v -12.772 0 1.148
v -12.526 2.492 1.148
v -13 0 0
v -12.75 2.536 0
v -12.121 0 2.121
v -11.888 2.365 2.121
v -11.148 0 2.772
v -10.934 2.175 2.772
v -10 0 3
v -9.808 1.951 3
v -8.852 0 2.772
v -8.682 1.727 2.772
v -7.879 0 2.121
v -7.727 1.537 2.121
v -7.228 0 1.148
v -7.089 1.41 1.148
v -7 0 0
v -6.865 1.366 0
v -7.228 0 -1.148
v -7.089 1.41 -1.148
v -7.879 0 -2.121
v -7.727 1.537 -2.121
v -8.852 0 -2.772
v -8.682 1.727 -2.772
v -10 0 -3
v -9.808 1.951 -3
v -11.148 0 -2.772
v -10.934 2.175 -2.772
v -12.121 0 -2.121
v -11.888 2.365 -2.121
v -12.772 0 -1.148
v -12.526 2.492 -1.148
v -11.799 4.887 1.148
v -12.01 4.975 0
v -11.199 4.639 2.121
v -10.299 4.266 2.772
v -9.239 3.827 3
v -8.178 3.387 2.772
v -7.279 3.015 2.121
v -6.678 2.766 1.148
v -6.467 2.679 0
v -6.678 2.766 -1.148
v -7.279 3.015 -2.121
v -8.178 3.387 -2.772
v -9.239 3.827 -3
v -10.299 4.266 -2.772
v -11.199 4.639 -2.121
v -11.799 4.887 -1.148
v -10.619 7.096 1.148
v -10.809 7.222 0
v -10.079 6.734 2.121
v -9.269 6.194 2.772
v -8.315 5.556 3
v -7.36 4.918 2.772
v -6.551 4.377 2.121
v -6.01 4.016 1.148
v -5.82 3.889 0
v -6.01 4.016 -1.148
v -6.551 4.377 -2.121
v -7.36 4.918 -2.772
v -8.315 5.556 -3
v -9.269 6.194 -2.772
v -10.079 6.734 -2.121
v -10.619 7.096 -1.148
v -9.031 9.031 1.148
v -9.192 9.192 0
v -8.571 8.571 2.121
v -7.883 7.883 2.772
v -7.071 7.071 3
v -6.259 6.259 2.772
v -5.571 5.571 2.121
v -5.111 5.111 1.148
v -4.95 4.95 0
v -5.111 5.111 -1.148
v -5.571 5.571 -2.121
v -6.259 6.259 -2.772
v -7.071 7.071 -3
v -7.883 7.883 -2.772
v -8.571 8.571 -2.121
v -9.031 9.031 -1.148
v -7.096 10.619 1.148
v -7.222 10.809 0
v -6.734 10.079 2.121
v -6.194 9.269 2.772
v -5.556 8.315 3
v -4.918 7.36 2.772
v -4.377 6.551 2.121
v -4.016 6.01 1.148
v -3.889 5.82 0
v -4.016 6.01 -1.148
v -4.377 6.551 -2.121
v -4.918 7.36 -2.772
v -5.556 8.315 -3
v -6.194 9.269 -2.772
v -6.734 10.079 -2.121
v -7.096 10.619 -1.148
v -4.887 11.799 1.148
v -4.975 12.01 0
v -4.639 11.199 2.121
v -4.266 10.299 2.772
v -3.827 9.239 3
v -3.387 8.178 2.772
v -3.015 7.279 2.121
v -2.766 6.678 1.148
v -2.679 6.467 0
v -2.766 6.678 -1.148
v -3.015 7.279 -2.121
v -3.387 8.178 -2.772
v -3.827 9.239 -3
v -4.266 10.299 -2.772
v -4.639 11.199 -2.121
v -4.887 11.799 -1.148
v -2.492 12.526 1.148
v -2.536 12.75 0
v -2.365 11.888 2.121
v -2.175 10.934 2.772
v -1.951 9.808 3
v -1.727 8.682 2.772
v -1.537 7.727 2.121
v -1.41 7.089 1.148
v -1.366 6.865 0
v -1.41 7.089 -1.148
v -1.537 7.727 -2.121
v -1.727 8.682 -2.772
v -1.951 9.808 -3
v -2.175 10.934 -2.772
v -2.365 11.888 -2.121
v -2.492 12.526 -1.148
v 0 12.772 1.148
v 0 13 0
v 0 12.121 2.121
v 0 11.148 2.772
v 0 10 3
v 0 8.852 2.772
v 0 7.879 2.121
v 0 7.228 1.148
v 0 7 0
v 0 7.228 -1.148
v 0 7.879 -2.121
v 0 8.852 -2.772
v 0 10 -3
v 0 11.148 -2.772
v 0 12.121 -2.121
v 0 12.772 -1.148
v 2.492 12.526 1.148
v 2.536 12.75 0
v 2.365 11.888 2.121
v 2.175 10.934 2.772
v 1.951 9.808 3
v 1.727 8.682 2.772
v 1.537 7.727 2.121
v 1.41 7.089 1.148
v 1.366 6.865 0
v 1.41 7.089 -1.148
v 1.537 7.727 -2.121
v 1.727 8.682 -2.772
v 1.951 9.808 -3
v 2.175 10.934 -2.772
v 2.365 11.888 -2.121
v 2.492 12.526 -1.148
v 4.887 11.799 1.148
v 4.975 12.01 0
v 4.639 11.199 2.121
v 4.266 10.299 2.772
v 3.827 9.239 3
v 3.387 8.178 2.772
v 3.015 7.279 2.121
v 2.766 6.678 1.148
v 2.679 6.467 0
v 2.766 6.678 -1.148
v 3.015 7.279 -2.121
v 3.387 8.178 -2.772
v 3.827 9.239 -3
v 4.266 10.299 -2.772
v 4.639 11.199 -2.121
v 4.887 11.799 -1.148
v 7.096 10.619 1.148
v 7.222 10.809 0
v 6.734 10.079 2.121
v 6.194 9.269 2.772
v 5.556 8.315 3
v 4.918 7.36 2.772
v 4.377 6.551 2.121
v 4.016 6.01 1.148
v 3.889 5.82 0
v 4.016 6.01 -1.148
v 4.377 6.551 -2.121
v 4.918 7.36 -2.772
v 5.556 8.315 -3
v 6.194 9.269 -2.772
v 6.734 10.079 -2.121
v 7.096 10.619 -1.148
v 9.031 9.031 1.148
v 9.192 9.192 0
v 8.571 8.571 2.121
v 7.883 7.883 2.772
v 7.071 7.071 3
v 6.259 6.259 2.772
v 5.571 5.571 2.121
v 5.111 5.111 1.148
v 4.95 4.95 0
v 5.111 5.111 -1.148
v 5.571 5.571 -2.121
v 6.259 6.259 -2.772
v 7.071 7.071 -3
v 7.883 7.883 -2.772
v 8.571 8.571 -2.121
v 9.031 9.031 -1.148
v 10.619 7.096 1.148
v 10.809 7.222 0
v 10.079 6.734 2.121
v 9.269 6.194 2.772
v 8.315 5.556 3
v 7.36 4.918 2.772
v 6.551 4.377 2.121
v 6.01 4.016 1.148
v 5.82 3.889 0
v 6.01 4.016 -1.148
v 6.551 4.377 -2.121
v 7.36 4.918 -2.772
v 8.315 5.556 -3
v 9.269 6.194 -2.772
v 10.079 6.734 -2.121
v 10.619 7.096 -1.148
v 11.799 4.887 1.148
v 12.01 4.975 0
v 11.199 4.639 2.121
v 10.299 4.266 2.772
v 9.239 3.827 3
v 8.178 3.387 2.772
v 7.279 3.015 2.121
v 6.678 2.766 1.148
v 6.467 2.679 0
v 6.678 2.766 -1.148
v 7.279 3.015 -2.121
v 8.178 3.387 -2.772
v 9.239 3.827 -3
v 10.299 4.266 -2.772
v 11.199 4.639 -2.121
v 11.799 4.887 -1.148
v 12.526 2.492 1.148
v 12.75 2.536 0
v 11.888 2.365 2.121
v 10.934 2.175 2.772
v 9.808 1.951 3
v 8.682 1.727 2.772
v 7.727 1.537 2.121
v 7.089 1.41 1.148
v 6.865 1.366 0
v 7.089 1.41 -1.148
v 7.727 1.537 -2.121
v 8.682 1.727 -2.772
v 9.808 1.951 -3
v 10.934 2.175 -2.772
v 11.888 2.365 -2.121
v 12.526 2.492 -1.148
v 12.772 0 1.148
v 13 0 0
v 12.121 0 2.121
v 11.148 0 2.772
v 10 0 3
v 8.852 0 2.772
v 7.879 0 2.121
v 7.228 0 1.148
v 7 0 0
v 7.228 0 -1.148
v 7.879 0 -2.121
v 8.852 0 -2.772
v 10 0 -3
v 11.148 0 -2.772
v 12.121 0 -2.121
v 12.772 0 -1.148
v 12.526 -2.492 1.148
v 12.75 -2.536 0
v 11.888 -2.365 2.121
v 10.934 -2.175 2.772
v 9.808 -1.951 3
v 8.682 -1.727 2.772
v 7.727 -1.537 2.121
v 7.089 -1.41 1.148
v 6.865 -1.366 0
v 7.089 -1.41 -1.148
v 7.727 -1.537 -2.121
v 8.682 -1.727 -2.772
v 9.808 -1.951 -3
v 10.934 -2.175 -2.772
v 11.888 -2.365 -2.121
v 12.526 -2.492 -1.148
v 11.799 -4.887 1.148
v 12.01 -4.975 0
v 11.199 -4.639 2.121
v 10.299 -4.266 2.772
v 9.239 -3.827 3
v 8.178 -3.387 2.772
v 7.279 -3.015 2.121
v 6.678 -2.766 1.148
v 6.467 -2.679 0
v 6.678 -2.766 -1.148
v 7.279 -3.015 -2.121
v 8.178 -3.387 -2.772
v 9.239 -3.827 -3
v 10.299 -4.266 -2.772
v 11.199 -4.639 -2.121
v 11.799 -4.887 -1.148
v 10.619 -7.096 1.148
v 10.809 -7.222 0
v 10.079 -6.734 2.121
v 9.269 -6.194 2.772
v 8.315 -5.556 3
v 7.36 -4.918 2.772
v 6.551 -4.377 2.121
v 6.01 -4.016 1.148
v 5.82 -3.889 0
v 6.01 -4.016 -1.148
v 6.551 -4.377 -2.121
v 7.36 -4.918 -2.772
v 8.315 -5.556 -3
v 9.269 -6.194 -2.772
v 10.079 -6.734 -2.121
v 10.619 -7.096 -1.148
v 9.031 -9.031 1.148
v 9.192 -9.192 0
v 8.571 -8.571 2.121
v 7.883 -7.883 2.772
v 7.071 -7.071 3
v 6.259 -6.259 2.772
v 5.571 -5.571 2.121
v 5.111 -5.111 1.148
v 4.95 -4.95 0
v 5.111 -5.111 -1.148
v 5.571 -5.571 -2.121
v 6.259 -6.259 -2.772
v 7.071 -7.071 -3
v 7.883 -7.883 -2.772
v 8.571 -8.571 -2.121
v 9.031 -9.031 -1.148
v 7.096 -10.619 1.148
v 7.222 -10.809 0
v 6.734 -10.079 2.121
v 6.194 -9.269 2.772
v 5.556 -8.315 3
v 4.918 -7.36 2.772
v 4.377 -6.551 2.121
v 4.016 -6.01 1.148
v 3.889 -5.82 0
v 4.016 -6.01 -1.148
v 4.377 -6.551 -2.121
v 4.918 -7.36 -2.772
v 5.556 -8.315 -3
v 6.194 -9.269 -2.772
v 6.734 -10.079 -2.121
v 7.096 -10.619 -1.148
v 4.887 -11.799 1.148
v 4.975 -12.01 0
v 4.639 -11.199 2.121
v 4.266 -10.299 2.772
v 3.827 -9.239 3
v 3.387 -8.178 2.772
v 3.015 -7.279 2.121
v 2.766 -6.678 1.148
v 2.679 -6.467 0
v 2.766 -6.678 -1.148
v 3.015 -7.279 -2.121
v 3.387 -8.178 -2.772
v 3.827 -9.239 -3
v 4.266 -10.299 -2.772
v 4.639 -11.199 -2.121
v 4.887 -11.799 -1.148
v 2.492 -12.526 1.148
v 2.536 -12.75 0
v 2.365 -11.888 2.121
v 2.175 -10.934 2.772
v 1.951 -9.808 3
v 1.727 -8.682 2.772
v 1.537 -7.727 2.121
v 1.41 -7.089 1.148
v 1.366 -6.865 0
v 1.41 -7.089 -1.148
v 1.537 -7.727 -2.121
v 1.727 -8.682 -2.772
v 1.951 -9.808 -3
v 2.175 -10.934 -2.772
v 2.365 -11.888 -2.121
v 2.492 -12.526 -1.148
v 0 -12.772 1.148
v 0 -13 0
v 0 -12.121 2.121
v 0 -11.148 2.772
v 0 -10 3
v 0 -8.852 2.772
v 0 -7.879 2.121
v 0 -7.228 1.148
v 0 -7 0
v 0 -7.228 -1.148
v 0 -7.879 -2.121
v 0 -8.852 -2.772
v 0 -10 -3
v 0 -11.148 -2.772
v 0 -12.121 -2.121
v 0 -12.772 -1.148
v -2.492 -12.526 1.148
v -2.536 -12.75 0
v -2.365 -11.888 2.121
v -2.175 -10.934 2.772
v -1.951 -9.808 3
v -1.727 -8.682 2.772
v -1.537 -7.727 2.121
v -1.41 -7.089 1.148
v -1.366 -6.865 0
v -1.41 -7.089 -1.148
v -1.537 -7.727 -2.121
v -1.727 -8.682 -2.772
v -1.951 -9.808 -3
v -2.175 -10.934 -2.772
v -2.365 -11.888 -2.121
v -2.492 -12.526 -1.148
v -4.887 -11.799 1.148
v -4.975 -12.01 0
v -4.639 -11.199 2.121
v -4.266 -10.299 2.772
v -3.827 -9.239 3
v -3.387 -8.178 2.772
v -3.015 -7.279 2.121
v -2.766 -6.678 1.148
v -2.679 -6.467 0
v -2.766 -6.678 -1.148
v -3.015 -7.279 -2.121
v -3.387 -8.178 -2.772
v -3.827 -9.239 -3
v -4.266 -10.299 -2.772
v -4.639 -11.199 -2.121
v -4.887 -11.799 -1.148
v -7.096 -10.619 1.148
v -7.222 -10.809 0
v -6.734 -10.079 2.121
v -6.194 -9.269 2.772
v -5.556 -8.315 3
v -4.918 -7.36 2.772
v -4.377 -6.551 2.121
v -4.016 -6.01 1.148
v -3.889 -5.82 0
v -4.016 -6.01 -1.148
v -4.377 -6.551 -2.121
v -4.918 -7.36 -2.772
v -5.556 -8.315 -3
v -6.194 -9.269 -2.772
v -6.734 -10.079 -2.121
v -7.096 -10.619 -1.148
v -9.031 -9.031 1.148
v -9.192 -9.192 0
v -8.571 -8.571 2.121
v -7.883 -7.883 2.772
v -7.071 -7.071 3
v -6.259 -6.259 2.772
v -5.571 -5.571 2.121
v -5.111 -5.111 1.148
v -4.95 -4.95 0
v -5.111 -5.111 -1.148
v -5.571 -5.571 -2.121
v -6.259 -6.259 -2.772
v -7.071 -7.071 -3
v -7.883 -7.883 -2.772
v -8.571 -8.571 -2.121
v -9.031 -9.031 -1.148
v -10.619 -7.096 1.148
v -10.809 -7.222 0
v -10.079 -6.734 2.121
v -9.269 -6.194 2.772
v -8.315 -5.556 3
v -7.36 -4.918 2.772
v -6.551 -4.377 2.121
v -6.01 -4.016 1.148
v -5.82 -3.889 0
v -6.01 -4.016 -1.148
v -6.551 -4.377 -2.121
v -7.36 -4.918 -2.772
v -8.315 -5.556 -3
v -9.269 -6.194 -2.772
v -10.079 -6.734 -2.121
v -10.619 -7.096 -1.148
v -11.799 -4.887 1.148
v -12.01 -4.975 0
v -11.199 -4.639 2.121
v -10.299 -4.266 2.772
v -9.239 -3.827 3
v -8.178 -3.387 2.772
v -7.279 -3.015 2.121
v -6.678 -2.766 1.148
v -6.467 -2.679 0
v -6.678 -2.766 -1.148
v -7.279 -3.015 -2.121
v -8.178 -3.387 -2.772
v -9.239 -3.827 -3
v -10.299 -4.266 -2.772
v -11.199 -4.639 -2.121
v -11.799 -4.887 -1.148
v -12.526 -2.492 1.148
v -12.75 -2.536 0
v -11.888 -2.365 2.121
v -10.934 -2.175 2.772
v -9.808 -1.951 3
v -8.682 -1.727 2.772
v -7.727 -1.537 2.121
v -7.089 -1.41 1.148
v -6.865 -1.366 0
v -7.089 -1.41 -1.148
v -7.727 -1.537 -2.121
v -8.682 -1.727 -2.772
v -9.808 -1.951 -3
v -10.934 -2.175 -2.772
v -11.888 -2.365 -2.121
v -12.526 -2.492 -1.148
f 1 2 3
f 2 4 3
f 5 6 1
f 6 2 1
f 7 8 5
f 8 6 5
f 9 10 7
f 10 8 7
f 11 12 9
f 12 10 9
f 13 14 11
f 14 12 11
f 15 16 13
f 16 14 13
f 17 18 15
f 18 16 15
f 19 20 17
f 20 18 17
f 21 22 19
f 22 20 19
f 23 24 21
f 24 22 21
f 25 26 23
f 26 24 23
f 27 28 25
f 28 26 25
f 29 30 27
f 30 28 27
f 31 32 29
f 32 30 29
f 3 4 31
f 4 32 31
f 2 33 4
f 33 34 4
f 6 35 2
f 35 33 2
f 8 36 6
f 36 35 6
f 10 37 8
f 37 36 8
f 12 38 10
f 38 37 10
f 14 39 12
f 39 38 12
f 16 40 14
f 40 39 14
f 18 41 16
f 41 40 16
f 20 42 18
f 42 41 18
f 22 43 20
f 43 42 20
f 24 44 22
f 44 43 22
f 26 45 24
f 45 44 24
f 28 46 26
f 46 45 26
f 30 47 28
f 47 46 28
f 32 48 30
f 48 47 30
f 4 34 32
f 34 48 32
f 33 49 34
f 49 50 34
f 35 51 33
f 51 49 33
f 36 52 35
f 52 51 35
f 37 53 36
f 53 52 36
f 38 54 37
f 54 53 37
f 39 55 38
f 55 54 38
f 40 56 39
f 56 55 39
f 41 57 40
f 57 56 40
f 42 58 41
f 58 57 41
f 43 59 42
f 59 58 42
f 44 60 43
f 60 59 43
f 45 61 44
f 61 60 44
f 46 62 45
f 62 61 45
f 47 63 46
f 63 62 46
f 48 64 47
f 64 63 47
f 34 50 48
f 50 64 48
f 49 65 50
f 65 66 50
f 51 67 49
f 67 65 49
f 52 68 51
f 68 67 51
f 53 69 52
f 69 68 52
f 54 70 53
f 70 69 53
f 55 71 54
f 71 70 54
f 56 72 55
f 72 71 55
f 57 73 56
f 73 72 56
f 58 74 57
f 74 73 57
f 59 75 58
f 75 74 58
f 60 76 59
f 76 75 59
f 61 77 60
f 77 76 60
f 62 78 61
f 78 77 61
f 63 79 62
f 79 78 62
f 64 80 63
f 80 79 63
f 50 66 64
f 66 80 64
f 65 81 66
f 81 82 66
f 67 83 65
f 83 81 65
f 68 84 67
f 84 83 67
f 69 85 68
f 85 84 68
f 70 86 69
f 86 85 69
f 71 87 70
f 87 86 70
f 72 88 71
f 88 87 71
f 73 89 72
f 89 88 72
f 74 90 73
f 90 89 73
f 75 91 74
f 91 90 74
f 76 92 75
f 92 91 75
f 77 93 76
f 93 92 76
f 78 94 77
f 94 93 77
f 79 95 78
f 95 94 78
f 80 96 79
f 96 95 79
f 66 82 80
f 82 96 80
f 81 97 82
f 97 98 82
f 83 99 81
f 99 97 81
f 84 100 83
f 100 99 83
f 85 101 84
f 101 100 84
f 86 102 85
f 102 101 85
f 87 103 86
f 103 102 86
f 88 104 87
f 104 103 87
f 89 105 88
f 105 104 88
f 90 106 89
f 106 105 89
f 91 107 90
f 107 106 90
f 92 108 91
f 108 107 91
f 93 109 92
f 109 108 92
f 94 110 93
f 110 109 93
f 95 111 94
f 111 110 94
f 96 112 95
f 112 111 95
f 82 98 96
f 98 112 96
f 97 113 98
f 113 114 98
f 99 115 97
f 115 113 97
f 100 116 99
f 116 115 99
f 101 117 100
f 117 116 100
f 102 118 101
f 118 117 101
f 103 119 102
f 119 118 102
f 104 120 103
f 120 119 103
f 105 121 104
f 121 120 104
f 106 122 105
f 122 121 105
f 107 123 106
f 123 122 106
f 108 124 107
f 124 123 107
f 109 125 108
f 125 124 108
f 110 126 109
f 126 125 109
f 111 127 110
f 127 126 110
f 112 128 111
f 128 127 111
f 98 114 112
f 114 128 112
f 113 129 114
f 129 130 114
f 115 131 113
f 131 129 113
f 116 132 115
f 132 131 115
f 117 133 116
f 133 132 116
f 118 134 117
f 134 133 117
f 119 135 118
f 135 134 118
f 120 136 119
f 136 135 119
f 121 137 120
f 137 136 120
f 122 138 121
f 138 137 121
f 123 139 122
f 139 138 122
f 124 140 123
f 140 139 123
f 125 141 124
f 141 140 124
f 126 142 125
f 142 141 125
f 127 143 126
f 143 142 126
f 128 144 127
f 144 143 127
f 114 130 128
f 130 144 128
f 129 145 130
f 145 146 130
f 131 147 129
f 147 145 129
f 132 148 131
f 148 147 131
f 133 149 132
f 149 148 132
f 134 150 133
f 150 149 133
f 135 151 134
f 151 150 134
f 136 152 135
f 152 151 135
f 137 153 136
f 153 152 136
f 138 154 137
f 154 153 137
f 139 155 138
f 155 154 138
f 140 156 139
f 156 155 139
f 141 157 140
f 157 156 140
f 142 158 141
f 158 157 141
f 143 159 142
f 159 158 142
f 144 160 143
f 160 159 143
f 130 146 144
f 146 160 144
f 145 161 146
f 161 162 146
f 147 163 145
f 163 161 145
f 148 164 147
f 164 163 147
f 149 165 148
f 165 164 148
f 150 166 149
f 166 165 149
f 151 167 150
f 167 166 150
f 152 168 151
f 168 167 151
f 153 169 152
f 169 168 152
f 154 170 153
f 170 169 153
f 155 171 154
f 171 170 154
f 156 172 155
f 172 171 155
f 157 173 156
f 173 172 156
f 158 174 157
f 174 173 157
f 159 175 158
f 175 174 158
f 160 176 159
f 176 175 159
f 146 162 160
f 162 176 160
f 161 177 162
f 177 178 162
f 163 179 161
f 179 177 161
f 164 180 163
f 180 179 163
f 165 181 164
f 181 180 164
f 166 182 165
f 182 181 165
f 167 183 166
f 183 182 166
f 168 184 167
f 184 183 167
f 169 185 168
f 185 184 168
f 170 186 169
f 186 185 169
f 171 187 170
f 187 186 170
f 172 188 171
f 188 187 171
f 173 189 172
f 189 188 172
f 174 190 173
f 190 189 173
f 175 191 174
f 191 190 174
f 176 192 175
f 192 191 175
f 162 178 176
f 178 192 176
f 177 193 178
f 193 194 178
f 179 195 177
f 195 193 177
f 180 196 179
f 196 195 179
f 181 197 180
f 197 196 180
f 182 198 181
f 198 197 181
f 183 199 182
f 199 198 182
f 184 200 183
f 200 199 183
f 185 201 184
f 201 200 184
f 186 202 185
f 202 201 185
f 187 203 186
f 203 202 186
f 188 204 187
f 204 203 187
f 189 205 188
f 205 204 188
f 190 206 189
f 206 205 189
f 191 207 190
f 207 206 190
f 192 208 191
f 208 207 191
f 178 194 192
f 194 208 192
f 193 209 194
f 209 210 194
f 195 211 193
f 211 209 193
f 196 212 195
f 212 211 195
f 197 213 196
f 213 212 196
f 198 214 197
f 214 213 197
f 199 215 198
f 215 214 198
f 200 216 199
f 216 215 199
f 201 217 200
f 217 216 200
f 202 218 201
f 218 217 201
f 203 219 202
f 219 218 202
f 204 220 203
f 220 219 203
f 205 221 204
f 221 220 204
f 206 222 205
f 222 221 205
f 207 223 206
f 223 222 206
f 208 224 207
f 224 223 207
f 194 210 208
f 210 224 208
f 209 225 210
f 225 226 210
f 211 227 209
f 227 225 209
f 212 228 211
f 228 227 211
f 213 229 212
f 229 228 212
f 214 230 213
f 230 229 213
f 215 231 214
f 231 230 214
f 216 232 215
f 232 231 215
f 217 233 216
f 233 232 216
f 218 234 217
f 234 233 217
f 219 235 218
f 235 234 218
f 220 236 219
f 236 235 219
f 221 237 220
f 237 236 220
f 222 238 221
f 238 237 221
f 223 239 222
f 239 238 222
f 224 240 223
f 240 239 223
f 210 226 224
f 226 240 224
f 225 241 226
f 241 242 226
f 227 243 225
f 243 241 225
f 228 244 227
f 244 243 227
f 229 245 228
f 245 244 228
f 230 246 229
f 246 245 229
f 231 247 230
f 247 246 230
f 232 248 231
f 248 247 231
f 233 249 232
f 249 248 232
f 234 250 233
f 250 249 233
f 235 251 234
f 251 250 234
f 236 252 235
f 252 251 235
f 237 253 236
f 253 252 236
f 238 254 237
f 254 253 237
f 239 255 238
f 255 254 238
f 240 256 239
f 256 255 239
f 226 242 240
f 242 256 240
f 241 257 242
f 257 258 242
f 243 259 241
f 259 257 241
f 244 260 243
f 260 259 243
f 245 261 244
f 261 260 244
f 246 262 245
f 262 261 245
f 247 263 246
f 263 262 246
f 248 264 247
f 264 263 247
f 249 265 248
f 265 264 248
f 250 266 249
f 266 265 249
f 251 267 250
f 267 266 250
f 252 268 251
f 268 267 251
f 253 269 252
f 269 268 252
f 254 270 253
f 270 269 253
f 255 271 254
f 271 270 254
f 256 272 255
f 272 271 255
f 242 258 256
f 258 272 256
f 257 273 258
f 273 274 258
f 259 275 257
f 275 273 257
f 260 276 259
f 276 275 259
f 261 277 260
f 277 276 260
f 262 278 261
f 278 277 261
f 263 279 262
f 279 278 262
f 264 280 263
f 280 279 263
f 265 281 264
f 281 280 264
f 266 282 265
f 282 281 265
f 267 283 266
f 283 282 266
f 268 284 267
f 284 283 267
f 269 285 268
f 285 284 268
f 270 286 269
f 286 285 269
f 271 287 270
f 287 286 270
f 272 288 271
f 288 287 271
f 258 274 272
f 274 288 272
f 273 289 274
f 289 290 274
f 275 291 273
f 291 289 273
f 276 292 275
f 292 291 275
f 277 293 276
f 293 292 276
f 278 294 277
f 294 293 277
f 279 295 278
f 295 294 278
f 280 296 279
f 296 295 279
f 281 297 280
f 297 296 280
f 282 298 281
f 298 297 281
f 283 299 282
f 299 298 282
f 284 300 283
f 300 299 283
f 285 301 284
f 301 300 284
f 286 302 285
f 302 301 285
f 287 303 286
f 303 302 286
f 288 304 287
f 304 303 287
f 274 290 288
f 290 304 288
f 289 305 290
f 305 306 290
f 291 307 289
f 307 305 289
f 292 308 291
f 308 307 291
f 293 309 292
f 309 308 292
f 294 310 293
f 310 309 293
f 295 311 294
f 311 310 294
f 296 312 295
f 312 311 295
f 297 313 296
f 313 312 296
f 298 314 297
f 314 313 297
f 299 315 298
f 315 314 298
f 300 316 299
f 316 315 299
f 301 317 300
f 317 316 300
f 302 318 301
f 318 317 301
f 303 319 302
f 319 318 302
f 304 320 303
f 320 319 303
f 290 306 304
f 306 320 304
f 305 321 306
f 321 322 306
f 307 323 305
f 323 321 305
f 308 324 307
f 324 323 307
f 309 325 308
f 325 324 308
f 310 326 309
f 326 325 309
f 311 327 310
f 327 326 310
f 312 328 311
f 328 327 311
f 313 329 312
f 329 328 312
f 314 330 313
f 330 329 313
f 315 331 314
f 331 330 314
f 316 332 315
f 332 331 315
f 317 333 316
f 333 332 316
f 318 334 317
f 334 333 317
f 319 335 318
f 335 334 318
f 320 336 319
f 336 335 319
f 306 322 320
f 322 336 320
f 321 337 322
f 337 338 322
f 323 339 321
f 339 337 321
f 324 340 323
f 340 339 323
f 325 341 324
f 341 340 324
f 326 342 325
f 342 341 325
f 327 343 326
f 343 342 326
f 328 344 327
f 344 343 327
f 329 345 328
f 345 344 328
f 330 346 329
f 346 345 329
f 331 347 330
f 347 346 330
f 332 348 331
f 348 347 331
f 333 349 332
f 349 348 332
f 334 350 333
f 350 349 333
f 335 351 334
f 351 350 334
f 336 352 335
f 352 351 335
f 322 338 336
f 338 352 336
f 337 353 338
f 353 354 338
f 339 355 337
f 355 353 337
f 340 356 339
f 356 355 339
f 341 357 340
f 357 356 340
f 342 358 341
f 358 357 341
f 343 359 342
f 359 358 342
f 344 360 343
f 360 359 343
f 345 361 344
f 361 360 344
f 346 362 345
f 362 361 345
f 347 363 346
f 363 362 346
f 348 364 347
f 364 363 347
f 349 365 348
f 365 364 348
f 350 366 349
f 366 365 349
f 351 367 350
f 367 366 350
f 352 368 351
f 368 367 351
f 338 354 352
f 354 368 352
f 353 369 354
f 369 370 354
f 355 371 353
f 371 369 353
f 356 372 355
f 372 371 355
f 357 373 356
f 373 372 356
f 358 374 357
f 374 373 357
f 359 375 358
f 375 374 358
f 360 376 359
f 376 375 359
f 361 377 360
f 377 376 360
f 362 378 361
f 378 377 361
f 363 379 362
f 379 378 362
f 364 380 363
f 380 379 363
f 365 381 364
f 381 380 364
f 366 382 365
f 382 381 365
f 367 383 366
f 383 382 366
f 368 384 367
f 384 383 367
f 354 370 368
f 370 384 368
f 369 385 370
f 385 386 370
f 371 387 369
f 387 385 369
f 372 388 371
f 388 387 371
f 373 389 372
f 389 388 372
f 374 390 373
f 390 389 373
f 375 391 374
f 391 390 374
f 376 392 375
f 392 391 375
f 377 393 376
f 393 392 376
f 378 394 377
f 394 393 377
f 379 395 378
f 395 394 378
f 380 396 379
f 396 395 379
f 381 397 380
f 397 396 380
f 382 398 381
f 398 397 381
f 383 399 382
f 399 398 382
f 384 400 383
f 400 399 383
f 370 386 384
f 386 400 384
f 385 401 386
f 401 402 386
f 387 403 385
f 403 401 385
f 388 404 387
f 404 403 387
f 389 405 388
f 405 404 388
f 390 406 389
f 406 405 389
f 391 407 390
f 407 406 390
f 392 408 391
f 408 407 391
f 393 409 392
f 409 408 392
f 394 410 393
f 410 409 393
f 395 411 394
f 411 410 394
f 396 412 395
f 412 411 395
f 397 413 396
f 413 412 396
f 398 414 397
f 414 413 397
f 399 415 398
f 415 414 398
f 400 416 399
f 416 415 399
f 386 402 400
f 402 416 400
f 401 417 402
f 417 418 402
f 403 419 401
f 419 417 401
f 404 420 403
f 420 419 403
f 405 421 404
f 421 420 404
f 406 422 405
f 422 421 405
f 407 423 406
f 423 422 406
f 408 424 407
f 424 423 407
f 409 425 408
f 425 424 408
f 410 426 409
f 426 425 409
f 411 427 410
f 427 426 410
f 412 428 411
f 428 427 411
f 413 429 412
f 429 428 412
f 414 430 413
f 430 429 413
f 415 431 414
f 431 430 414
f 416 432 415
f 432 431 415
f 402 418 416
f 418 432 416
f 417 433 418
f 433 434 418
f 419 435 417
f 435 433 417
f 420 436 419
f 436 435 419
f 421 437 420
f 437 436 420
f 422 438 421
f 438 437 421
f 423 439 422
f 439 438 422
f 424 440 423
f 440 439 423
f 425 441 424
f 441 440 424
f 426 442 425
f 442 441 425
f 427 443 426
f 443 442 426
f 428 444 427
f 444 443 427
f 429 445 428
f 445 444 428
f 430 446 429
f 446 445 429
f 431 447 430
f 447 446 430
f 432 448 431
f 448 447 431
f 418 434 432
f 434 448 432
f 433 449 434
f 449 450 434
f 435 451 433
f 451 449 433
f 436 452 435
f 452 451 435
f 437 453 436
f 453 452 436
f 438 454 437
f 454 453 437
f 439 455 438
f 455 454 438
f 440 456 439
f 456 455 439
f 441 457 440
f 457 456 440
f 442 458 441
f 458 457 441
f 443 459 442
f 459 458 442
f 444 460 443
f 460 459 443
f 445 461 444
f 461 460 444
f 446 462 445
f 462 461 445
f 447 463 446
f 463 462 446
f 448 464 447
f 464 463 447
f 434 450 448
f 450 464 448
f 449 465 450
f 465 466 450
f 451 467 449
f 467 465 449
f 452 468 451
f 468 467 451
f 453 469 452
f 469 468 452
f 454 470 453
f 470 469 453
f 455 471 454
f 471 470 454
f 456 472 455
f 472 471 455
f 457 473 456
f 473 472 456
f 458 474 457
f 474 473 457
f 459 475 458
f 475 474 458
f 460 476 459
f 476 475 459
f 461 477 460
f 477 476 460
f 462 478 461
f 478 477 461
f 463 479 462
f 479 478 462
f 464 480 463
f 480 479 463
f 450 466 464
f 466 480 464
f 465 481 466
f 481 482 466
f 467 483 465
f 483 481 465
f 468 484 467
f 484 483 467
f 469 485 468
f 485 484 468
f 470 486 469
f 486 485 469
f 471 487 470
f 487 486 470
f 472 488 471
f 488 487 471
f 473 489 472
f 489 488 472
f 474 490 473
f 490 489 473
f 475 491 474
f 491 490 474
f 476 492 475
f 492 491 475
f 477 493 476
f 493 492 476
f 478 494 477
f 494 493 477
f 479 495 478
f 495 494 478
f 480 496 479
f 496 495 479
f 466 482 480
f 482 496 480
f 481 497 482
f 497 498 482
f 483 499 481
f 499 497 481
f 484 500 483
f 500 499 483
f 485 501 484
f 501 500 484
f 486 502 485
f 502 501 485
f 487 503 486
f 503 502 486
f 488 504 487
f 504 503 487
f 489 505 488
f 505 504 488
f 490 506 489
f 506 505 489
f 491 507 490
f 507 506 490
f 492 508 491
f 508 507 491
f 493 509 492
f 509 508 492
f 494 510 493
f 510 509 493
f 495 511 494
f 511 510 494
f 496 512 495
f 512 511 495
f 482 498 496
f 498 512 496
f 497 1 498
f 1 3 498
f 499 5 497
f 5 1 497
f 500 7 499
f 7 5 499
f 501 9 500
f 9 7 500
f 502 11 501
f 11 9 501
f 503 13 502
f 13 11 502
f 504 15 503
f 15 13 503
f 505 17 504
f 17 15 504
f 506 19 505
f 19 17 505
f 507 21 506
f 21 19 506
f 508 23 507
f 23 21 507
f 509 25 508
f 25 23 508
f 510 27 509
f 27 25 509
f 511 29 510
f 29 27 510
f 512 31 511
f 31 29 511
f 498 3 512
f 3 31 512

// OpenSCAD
rotate_extrude($fn = 32) translate([10, 0]) circle(r = 3, $fn = 16);
